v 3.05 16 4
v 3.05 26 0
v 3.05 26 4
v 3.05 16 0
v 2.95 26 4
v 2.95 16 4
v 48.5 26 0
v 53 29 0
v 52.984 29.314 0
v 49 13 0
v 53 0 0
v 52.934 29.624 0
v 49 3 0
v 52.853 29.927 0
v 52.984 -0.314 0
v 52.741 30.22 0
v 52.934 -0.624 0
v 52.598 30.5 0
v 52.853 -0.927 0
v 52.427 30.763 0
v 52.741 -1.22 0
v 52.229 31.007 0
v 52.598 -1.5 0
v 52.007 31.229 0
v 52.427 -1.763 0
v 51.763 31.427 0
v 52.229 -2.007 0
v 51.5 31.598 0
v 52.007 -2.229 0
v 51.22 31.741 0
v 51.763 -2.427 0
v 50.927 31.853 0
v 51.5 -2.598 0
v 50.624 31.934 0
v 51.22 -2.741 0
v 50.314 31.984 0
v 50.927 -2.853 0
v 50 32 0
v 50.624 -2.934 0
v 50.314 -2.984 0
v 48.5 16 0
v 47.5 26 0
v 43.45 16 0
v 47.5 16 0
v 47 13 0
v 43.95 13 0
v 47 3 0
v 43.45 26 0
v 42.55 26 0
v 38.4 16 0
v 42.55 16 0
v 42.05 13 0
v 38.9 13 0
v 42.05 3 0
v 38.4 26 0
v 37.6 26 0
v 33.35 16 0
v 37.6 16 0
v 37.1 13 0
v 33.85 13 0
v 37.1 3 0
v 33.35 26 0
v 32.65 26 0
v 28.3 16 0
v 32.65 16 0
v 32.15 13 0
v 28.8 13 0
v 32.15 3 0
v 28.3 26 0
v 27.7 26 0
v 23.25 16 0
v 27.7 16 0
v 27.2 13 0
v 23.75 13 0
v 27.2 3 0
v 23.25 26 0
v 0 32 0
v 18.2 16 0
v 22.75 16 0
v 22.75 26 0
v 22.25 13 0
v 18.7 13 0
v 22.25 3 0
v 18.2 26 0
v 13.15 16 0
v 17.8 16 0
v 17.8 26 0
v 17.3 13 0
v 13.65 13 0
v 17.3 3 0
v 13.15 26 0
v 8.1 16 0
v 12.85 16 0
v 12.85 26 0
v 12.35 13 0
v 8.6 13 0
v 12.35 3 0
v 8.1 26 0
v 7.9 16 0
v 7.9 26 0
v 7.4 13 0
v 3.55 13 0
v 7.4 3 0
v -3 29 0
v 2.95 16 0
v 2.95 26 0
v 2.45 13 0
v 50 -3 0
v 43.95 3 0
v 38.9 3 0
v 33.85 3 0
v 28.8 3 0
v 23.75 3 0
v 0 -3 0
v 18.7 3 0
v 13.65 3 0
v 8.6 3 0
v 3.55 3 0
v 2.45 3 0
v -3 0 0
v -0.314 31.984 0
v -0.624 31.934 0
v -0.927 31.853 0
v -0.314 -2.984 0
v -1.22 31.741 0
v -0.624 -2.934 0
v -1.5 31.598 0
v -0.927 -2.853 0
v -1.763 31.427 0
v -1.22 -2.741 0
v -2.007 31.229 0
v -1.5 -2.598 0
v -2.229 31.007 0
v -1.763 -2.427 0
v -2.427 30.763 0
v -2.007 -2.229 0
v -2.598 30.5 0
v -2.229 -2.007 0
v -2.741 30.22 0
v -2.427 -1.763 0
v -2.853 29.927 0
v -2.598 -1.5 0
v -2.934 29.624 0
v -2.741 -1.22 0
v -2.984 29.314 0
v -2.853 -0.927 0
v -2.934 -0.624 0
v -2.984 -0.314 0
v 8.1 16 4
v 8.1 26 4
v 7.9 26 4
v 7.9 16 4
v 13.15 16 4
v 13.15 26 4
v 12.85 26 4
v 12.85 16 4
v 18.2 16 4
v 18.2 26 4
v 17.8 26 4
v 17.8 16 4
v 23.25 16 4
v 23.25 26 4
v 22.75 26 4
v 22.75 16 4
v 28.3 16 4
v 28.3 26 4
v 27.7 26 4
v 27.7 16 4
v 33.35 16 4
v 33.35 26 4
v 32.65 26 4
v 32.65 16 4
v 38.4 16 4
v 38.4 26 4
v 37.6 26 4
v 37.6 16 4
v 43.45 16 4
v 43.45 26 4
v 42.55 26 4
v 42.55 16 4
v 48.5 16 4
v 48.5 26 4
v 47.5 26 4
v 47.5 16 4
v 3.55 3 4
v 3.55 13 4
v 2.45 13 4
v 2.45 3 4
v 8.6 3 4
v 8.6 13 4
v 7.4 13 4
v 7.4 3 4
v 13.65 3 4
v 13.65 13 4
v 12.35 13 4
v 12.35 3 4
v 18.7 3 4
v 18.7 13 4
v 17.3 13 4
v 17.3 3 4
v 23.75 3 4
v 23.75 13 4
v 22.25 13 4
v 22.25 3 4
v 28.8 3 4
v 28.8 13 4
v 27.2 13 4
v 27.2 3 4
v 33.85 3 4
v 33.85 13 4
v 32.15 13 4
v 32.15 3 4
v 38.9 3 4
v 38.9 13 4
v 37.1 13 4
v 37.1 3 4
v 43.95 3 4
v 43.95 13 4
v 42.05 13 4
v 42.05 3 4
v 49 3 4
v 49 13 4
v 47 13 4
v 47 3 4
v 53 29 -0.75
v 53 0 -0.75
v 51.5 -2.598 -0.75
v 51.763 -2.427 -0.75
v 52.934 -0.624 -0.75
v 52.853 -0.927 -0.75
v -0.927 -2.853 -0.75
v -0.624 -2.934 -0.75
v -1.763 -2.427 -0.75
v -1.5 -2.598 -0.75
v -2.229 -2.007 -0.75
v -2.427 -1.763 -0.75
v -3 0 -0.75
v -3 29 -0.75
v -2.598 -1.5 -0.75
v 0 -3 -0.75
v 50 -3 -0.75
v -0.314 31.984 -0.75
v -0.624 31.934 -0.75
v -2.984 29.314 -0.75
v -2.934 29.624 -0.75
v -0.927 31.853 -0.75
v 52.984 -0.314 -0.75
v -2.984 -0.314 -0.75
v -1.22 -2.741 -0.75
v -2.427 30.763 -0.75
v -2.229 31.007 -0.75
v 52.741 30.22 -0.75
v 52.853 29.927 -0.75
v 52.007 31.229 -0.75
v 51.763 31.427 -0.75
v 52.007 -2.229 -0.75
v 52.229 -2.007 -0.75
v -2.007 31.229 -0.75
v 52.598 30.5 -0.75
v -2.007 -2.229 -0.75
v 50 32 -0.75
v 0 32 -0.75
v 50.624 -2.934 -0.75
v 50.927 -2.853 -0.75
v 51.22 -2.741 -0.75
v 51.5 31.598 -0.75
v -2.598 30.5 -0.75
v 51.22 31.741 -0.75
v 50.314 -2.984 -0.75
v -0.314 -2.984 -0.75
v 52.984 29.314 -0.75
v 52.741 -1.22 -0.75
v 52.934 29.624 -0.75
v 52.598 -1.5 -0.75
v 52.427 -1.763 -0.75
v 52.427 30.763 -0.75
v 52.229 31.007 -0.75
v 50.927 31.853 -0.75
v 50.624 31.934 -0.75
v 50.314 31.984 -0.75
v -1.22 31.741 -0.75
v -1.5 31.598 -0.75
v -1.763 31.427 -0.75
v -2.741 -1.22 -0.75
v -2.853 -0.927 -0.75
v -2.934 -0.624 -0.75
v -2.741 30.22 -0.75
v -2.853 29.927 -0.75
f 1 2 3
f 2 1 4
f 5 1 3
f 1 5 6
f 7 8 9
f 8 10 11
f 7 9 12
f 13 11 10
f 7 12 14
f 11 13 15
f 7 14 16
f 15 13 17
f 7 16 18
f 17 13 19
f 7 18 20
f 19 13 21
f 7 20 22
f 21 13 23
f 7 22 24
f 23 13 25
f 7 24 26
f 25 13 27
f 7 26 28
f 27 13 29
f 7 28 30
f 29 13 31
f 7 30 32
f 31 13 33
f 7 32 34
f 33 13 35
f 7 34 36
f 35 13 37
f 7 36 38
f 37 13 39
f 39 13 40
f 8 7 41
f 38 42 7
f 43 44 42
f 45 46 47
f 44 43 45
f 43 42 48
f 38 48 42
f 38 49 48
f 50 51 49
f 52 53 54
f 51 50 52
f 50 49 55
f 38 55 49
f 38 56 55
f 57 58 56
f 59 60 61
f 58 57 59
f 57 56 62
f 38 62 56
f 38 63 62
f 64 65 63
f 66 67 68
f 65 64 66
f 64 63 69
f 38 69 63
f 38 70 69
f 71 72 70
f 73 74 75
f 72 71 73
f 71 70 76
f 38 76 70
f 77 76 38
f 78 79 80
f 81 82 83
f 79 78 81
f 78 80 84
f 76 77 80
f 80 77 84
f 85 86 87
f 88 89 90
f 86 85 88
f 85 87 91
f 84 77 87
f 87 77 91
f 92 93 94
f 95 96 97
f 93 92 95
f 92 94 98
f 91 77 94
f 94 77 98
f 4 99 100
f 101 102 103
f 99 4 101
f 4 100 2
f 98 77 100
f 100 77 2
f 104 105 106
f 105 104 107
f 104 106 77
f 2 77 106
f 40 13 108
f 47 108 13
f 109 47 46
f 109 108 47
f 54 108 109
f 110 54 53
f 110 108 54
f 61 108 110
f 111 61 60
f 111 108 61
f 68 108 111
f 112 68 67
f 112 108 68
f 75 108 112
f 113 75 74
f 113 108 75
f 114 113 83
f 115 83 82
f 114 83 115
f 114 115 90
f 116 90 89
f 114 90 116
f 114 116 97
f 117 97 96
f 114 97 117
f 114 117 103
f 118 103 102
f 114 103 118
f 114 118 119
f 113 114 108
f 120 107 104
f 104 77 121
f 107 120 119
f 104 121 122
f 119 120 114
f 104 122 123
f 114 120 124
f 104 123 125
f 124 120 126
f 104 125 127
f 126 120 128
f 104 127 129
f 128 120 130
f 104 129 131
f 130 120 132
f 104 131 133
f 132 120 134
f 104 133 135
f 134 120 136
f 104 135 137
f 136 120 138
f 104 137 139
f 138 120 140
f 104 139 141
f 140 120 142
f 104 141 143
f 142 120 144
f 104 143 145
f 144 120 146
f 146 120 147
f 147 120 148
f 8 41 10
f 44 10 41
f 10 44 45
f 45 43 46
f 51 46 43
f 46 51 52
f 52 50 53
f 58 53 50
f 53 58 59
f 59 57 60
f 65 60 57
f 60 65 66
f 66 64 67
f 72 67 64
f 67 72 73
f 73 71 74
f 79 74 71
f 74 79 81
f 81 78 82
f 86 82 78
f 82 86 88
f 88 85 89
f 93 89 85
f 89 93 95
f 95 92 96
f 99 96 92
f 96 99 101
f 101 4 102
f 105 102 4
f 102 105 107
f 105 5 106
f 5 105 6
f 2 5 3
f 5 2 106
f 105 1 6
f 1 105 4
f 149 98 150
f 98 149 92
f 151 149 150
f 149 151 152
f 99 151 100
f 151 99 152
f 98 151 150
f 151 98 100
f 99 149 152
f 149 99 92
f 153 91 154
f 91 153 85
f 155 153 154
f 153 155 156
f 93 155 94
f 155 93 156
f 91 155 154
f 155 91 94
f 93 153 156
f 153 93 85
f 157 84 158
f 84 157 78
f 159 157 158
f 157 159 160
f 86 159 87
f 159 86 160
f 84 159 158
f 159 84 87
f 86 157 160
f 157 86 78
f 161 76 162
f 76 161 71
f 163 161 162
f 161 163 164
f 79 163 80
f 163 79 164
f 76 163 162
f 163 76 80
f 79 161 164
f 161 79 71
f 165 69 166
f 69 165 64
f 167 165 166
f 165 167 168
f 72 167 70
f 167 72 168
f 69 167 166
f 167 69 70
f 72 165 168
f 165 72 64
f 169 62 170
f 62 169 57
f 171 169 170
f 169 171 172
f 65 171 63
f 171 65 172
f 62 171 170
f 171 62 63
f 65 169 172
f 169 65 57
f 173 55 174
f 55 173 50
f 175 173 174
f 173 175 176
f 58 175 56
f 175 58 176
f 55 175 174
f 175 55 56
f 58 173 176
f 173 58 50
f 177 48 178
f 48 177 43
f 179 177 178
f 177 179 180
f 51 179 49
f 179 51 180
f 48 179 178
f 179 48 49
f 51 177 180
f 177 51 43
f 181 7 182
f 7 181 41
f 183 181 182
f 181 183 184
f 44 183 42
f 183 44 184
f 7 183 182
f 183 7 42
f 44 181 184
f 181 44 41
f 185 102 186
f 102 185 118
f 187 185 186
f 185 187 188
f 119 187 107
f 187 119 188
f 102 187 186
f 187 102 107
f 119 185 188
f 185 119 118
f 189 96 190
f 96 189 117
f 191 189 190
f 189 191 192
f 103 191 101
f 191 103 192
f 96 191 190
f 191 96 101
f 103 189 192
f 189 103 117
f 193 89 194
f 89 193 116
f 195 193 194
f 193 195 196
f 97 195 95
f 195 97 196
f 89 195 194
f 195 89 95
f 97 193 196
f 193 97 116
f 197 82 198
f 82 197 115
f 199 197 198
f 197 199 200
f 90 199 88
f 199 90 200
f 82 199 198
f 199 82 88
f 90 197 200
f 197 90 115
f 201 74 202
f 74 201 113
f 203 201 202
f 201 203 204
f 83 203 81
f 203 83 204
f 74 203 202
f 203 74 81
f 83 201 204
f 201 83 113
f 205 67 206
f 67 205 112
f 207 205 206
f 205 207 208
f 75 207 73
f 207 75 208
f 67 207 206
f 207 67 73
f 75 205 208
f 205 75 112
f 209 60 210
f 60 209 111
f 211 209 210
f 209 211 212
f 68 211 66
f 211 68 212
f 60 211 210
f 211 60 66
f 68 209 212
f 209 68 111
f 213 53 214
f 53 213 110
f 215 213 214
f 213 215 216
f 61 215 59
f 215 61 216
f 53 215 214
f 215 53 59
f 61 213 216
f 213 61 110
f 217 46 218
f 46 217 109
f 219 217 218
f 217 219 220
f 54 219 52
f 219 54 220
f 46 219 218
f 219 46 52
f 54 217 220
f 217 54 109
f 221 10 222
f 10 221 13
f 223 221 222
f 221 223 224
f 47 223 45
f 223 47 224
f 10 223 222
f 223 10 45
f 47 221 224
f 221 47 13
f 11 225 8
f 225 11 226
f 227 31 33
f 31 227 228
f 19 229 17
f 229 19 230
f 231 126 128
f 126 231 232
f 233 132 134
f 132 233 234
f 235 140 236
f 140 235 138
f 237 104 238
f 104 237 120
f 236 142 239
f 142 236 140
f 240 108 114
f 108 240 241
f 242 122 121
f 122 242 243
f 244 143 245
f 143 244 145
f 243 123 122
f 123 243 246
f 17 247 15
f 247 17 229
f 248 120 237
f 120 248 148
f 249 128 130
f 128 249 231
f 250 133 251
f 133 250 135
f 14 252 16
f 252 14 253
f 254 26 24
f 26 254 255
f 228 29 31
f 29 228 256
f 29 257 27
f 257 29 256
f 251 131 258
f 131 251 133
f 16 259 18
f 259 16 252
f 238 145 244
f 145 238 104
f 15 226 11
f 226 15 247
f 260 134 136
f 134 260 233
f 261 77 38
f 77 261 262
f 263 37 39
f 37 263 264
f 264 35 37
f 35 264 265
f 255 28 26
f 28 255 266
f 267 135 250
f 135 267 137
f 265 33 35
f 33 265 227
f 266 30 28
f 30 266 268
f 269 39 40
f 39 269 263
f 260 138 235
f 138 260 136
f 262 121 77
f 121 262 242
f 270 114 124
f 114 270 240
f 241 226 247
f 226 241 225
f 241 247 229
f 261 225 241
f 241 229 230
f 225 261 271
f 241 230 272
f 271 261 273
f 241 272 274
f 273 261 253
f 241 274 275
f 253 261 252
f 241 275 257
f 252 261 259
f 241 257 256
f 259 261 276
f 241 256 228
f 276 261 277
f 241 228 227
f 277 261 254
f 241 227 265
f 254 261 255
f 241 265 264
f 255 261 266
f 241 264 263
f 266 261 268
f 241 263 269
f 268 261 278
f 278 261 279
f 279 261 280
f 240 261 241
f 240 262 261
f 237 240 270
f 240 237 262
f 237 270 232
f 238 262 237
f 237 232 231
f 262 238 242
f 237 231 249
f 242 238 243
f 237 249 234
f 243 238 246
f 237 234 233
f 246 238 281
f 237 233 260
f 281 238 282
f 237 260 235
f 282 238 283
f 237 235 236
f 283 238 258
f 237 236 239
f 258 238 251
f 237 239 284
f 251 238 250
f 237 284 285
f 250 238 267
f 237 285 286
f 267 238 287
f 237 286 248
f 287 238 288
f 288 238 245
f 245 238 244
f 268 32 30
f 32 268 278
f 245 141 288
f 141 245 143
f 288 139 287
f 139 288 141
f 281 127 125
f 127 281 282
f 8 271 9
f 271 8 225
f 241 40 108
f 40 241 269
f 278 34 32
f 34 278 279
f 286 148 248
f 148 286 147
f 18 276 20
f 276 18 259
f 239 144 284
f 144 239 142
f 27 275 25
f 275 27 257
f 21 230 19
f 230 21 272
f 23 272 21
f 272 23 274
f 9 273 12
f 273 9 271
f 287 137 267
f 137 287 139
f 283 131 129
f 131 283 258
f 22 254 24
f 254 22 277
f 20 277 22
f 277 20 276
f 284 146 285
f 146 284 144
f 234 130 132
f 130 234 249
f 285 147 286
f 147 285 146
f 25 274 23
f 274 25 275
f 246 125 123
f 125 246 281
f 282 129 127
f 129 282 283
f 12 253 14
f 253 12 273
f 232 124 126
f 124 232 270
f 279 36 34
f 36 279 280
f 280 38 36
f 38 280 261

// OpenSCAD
// [FL_INDEX: keywords="openscad, 3d_parametric, Wall___Gap_Test_Prints__Customizable, csg_solid" | COT="Parametric OpenSCAD design from 3DCodeverse"]
// Title: Wall / Gap Test Prints (Customizable)

// wall/gap test print (vertical)


// wall height or gap test
_1_style = 1; //[1:Wall,2:Gap]

// start thickness
_2_start = 0.1;

// end thickness
_3_end = 2.0;

// thickness increment between samples
_4_increment = 0.1;

// space between samples
_5_gap = 3.0; // [1:10]

// wall height
_6_height = 4; // [1:50]

// wall length
_7_length = 10; // [1:50]

// thickness of the base
_8_baseHeight = 1.0; // [1:10]

// number of columns across
_9_numColumns = 10; // [1:20]

// ignore (angle resolution)
$fn=60;

////////////////////////////////////////////////////////////
module addWall(thickness, xspacing, yspacing, xpos, ypos, h) {
	echo (ypos, xpos, thickness);
	translate([xspacing * xpos, -yspacing * ypos, 0]) {
		cube([thickness, _7_length, h]);
	}
}

module addWallGrid(wallHeight) {
	count = round((_3_end-_2_start)/_4_increment)+1;
	xspacing = _5_gap + _3_end;
	yspacing = _5_gap + _7_length;
	translate([_5_gap, -_5_gap - _7_length, 0]) {
		for (index = [0:count-1]) {
			assign(thickness = _2_start + _4_increment * index) {
				translate([-thickness/2, 0, 0]) {
					addWall(thickness, xspacing, yspacing, index%_9_numColumns, floor(index/_9_numColumns), wallHeight);
				}
			}
		}
	}
}

module addBase(x, y, height) {
	translate([0, 0, -height*.75]) {
		minkowski() {
			cube([x, y, height/2]);
			cylinder(r=_5_gap,h=height/4);
		}
	}
}

module thinWallTest() {
	count = round((_3_end-_2_start)/_4_increment)+1;
	xspacing = _5_gap + _3_end;
	yspacing = _5_gap + _7_length;
	xdim = xspacing * min(_9_numColumns, count);
	ydim = yspacing * ceil(count/_9_numColumns)+_5_gap;
	if (_1_style == 1) {
		union () {
			addBase(xdim, ydim, _8_baseHeight);
			translate([0, ydim, 0]) { 
				addWallGrid(_6_height);
			}
		}
	} else {
		difference () {
			addBase(xdim, ydim, _8_baseHeight);
			translate([0, ydim, -_8_baseHeight-1]) {
				addWallGrid(_8_baseHeight+2);
			}
		}
	}	
}

thinWallTest();
